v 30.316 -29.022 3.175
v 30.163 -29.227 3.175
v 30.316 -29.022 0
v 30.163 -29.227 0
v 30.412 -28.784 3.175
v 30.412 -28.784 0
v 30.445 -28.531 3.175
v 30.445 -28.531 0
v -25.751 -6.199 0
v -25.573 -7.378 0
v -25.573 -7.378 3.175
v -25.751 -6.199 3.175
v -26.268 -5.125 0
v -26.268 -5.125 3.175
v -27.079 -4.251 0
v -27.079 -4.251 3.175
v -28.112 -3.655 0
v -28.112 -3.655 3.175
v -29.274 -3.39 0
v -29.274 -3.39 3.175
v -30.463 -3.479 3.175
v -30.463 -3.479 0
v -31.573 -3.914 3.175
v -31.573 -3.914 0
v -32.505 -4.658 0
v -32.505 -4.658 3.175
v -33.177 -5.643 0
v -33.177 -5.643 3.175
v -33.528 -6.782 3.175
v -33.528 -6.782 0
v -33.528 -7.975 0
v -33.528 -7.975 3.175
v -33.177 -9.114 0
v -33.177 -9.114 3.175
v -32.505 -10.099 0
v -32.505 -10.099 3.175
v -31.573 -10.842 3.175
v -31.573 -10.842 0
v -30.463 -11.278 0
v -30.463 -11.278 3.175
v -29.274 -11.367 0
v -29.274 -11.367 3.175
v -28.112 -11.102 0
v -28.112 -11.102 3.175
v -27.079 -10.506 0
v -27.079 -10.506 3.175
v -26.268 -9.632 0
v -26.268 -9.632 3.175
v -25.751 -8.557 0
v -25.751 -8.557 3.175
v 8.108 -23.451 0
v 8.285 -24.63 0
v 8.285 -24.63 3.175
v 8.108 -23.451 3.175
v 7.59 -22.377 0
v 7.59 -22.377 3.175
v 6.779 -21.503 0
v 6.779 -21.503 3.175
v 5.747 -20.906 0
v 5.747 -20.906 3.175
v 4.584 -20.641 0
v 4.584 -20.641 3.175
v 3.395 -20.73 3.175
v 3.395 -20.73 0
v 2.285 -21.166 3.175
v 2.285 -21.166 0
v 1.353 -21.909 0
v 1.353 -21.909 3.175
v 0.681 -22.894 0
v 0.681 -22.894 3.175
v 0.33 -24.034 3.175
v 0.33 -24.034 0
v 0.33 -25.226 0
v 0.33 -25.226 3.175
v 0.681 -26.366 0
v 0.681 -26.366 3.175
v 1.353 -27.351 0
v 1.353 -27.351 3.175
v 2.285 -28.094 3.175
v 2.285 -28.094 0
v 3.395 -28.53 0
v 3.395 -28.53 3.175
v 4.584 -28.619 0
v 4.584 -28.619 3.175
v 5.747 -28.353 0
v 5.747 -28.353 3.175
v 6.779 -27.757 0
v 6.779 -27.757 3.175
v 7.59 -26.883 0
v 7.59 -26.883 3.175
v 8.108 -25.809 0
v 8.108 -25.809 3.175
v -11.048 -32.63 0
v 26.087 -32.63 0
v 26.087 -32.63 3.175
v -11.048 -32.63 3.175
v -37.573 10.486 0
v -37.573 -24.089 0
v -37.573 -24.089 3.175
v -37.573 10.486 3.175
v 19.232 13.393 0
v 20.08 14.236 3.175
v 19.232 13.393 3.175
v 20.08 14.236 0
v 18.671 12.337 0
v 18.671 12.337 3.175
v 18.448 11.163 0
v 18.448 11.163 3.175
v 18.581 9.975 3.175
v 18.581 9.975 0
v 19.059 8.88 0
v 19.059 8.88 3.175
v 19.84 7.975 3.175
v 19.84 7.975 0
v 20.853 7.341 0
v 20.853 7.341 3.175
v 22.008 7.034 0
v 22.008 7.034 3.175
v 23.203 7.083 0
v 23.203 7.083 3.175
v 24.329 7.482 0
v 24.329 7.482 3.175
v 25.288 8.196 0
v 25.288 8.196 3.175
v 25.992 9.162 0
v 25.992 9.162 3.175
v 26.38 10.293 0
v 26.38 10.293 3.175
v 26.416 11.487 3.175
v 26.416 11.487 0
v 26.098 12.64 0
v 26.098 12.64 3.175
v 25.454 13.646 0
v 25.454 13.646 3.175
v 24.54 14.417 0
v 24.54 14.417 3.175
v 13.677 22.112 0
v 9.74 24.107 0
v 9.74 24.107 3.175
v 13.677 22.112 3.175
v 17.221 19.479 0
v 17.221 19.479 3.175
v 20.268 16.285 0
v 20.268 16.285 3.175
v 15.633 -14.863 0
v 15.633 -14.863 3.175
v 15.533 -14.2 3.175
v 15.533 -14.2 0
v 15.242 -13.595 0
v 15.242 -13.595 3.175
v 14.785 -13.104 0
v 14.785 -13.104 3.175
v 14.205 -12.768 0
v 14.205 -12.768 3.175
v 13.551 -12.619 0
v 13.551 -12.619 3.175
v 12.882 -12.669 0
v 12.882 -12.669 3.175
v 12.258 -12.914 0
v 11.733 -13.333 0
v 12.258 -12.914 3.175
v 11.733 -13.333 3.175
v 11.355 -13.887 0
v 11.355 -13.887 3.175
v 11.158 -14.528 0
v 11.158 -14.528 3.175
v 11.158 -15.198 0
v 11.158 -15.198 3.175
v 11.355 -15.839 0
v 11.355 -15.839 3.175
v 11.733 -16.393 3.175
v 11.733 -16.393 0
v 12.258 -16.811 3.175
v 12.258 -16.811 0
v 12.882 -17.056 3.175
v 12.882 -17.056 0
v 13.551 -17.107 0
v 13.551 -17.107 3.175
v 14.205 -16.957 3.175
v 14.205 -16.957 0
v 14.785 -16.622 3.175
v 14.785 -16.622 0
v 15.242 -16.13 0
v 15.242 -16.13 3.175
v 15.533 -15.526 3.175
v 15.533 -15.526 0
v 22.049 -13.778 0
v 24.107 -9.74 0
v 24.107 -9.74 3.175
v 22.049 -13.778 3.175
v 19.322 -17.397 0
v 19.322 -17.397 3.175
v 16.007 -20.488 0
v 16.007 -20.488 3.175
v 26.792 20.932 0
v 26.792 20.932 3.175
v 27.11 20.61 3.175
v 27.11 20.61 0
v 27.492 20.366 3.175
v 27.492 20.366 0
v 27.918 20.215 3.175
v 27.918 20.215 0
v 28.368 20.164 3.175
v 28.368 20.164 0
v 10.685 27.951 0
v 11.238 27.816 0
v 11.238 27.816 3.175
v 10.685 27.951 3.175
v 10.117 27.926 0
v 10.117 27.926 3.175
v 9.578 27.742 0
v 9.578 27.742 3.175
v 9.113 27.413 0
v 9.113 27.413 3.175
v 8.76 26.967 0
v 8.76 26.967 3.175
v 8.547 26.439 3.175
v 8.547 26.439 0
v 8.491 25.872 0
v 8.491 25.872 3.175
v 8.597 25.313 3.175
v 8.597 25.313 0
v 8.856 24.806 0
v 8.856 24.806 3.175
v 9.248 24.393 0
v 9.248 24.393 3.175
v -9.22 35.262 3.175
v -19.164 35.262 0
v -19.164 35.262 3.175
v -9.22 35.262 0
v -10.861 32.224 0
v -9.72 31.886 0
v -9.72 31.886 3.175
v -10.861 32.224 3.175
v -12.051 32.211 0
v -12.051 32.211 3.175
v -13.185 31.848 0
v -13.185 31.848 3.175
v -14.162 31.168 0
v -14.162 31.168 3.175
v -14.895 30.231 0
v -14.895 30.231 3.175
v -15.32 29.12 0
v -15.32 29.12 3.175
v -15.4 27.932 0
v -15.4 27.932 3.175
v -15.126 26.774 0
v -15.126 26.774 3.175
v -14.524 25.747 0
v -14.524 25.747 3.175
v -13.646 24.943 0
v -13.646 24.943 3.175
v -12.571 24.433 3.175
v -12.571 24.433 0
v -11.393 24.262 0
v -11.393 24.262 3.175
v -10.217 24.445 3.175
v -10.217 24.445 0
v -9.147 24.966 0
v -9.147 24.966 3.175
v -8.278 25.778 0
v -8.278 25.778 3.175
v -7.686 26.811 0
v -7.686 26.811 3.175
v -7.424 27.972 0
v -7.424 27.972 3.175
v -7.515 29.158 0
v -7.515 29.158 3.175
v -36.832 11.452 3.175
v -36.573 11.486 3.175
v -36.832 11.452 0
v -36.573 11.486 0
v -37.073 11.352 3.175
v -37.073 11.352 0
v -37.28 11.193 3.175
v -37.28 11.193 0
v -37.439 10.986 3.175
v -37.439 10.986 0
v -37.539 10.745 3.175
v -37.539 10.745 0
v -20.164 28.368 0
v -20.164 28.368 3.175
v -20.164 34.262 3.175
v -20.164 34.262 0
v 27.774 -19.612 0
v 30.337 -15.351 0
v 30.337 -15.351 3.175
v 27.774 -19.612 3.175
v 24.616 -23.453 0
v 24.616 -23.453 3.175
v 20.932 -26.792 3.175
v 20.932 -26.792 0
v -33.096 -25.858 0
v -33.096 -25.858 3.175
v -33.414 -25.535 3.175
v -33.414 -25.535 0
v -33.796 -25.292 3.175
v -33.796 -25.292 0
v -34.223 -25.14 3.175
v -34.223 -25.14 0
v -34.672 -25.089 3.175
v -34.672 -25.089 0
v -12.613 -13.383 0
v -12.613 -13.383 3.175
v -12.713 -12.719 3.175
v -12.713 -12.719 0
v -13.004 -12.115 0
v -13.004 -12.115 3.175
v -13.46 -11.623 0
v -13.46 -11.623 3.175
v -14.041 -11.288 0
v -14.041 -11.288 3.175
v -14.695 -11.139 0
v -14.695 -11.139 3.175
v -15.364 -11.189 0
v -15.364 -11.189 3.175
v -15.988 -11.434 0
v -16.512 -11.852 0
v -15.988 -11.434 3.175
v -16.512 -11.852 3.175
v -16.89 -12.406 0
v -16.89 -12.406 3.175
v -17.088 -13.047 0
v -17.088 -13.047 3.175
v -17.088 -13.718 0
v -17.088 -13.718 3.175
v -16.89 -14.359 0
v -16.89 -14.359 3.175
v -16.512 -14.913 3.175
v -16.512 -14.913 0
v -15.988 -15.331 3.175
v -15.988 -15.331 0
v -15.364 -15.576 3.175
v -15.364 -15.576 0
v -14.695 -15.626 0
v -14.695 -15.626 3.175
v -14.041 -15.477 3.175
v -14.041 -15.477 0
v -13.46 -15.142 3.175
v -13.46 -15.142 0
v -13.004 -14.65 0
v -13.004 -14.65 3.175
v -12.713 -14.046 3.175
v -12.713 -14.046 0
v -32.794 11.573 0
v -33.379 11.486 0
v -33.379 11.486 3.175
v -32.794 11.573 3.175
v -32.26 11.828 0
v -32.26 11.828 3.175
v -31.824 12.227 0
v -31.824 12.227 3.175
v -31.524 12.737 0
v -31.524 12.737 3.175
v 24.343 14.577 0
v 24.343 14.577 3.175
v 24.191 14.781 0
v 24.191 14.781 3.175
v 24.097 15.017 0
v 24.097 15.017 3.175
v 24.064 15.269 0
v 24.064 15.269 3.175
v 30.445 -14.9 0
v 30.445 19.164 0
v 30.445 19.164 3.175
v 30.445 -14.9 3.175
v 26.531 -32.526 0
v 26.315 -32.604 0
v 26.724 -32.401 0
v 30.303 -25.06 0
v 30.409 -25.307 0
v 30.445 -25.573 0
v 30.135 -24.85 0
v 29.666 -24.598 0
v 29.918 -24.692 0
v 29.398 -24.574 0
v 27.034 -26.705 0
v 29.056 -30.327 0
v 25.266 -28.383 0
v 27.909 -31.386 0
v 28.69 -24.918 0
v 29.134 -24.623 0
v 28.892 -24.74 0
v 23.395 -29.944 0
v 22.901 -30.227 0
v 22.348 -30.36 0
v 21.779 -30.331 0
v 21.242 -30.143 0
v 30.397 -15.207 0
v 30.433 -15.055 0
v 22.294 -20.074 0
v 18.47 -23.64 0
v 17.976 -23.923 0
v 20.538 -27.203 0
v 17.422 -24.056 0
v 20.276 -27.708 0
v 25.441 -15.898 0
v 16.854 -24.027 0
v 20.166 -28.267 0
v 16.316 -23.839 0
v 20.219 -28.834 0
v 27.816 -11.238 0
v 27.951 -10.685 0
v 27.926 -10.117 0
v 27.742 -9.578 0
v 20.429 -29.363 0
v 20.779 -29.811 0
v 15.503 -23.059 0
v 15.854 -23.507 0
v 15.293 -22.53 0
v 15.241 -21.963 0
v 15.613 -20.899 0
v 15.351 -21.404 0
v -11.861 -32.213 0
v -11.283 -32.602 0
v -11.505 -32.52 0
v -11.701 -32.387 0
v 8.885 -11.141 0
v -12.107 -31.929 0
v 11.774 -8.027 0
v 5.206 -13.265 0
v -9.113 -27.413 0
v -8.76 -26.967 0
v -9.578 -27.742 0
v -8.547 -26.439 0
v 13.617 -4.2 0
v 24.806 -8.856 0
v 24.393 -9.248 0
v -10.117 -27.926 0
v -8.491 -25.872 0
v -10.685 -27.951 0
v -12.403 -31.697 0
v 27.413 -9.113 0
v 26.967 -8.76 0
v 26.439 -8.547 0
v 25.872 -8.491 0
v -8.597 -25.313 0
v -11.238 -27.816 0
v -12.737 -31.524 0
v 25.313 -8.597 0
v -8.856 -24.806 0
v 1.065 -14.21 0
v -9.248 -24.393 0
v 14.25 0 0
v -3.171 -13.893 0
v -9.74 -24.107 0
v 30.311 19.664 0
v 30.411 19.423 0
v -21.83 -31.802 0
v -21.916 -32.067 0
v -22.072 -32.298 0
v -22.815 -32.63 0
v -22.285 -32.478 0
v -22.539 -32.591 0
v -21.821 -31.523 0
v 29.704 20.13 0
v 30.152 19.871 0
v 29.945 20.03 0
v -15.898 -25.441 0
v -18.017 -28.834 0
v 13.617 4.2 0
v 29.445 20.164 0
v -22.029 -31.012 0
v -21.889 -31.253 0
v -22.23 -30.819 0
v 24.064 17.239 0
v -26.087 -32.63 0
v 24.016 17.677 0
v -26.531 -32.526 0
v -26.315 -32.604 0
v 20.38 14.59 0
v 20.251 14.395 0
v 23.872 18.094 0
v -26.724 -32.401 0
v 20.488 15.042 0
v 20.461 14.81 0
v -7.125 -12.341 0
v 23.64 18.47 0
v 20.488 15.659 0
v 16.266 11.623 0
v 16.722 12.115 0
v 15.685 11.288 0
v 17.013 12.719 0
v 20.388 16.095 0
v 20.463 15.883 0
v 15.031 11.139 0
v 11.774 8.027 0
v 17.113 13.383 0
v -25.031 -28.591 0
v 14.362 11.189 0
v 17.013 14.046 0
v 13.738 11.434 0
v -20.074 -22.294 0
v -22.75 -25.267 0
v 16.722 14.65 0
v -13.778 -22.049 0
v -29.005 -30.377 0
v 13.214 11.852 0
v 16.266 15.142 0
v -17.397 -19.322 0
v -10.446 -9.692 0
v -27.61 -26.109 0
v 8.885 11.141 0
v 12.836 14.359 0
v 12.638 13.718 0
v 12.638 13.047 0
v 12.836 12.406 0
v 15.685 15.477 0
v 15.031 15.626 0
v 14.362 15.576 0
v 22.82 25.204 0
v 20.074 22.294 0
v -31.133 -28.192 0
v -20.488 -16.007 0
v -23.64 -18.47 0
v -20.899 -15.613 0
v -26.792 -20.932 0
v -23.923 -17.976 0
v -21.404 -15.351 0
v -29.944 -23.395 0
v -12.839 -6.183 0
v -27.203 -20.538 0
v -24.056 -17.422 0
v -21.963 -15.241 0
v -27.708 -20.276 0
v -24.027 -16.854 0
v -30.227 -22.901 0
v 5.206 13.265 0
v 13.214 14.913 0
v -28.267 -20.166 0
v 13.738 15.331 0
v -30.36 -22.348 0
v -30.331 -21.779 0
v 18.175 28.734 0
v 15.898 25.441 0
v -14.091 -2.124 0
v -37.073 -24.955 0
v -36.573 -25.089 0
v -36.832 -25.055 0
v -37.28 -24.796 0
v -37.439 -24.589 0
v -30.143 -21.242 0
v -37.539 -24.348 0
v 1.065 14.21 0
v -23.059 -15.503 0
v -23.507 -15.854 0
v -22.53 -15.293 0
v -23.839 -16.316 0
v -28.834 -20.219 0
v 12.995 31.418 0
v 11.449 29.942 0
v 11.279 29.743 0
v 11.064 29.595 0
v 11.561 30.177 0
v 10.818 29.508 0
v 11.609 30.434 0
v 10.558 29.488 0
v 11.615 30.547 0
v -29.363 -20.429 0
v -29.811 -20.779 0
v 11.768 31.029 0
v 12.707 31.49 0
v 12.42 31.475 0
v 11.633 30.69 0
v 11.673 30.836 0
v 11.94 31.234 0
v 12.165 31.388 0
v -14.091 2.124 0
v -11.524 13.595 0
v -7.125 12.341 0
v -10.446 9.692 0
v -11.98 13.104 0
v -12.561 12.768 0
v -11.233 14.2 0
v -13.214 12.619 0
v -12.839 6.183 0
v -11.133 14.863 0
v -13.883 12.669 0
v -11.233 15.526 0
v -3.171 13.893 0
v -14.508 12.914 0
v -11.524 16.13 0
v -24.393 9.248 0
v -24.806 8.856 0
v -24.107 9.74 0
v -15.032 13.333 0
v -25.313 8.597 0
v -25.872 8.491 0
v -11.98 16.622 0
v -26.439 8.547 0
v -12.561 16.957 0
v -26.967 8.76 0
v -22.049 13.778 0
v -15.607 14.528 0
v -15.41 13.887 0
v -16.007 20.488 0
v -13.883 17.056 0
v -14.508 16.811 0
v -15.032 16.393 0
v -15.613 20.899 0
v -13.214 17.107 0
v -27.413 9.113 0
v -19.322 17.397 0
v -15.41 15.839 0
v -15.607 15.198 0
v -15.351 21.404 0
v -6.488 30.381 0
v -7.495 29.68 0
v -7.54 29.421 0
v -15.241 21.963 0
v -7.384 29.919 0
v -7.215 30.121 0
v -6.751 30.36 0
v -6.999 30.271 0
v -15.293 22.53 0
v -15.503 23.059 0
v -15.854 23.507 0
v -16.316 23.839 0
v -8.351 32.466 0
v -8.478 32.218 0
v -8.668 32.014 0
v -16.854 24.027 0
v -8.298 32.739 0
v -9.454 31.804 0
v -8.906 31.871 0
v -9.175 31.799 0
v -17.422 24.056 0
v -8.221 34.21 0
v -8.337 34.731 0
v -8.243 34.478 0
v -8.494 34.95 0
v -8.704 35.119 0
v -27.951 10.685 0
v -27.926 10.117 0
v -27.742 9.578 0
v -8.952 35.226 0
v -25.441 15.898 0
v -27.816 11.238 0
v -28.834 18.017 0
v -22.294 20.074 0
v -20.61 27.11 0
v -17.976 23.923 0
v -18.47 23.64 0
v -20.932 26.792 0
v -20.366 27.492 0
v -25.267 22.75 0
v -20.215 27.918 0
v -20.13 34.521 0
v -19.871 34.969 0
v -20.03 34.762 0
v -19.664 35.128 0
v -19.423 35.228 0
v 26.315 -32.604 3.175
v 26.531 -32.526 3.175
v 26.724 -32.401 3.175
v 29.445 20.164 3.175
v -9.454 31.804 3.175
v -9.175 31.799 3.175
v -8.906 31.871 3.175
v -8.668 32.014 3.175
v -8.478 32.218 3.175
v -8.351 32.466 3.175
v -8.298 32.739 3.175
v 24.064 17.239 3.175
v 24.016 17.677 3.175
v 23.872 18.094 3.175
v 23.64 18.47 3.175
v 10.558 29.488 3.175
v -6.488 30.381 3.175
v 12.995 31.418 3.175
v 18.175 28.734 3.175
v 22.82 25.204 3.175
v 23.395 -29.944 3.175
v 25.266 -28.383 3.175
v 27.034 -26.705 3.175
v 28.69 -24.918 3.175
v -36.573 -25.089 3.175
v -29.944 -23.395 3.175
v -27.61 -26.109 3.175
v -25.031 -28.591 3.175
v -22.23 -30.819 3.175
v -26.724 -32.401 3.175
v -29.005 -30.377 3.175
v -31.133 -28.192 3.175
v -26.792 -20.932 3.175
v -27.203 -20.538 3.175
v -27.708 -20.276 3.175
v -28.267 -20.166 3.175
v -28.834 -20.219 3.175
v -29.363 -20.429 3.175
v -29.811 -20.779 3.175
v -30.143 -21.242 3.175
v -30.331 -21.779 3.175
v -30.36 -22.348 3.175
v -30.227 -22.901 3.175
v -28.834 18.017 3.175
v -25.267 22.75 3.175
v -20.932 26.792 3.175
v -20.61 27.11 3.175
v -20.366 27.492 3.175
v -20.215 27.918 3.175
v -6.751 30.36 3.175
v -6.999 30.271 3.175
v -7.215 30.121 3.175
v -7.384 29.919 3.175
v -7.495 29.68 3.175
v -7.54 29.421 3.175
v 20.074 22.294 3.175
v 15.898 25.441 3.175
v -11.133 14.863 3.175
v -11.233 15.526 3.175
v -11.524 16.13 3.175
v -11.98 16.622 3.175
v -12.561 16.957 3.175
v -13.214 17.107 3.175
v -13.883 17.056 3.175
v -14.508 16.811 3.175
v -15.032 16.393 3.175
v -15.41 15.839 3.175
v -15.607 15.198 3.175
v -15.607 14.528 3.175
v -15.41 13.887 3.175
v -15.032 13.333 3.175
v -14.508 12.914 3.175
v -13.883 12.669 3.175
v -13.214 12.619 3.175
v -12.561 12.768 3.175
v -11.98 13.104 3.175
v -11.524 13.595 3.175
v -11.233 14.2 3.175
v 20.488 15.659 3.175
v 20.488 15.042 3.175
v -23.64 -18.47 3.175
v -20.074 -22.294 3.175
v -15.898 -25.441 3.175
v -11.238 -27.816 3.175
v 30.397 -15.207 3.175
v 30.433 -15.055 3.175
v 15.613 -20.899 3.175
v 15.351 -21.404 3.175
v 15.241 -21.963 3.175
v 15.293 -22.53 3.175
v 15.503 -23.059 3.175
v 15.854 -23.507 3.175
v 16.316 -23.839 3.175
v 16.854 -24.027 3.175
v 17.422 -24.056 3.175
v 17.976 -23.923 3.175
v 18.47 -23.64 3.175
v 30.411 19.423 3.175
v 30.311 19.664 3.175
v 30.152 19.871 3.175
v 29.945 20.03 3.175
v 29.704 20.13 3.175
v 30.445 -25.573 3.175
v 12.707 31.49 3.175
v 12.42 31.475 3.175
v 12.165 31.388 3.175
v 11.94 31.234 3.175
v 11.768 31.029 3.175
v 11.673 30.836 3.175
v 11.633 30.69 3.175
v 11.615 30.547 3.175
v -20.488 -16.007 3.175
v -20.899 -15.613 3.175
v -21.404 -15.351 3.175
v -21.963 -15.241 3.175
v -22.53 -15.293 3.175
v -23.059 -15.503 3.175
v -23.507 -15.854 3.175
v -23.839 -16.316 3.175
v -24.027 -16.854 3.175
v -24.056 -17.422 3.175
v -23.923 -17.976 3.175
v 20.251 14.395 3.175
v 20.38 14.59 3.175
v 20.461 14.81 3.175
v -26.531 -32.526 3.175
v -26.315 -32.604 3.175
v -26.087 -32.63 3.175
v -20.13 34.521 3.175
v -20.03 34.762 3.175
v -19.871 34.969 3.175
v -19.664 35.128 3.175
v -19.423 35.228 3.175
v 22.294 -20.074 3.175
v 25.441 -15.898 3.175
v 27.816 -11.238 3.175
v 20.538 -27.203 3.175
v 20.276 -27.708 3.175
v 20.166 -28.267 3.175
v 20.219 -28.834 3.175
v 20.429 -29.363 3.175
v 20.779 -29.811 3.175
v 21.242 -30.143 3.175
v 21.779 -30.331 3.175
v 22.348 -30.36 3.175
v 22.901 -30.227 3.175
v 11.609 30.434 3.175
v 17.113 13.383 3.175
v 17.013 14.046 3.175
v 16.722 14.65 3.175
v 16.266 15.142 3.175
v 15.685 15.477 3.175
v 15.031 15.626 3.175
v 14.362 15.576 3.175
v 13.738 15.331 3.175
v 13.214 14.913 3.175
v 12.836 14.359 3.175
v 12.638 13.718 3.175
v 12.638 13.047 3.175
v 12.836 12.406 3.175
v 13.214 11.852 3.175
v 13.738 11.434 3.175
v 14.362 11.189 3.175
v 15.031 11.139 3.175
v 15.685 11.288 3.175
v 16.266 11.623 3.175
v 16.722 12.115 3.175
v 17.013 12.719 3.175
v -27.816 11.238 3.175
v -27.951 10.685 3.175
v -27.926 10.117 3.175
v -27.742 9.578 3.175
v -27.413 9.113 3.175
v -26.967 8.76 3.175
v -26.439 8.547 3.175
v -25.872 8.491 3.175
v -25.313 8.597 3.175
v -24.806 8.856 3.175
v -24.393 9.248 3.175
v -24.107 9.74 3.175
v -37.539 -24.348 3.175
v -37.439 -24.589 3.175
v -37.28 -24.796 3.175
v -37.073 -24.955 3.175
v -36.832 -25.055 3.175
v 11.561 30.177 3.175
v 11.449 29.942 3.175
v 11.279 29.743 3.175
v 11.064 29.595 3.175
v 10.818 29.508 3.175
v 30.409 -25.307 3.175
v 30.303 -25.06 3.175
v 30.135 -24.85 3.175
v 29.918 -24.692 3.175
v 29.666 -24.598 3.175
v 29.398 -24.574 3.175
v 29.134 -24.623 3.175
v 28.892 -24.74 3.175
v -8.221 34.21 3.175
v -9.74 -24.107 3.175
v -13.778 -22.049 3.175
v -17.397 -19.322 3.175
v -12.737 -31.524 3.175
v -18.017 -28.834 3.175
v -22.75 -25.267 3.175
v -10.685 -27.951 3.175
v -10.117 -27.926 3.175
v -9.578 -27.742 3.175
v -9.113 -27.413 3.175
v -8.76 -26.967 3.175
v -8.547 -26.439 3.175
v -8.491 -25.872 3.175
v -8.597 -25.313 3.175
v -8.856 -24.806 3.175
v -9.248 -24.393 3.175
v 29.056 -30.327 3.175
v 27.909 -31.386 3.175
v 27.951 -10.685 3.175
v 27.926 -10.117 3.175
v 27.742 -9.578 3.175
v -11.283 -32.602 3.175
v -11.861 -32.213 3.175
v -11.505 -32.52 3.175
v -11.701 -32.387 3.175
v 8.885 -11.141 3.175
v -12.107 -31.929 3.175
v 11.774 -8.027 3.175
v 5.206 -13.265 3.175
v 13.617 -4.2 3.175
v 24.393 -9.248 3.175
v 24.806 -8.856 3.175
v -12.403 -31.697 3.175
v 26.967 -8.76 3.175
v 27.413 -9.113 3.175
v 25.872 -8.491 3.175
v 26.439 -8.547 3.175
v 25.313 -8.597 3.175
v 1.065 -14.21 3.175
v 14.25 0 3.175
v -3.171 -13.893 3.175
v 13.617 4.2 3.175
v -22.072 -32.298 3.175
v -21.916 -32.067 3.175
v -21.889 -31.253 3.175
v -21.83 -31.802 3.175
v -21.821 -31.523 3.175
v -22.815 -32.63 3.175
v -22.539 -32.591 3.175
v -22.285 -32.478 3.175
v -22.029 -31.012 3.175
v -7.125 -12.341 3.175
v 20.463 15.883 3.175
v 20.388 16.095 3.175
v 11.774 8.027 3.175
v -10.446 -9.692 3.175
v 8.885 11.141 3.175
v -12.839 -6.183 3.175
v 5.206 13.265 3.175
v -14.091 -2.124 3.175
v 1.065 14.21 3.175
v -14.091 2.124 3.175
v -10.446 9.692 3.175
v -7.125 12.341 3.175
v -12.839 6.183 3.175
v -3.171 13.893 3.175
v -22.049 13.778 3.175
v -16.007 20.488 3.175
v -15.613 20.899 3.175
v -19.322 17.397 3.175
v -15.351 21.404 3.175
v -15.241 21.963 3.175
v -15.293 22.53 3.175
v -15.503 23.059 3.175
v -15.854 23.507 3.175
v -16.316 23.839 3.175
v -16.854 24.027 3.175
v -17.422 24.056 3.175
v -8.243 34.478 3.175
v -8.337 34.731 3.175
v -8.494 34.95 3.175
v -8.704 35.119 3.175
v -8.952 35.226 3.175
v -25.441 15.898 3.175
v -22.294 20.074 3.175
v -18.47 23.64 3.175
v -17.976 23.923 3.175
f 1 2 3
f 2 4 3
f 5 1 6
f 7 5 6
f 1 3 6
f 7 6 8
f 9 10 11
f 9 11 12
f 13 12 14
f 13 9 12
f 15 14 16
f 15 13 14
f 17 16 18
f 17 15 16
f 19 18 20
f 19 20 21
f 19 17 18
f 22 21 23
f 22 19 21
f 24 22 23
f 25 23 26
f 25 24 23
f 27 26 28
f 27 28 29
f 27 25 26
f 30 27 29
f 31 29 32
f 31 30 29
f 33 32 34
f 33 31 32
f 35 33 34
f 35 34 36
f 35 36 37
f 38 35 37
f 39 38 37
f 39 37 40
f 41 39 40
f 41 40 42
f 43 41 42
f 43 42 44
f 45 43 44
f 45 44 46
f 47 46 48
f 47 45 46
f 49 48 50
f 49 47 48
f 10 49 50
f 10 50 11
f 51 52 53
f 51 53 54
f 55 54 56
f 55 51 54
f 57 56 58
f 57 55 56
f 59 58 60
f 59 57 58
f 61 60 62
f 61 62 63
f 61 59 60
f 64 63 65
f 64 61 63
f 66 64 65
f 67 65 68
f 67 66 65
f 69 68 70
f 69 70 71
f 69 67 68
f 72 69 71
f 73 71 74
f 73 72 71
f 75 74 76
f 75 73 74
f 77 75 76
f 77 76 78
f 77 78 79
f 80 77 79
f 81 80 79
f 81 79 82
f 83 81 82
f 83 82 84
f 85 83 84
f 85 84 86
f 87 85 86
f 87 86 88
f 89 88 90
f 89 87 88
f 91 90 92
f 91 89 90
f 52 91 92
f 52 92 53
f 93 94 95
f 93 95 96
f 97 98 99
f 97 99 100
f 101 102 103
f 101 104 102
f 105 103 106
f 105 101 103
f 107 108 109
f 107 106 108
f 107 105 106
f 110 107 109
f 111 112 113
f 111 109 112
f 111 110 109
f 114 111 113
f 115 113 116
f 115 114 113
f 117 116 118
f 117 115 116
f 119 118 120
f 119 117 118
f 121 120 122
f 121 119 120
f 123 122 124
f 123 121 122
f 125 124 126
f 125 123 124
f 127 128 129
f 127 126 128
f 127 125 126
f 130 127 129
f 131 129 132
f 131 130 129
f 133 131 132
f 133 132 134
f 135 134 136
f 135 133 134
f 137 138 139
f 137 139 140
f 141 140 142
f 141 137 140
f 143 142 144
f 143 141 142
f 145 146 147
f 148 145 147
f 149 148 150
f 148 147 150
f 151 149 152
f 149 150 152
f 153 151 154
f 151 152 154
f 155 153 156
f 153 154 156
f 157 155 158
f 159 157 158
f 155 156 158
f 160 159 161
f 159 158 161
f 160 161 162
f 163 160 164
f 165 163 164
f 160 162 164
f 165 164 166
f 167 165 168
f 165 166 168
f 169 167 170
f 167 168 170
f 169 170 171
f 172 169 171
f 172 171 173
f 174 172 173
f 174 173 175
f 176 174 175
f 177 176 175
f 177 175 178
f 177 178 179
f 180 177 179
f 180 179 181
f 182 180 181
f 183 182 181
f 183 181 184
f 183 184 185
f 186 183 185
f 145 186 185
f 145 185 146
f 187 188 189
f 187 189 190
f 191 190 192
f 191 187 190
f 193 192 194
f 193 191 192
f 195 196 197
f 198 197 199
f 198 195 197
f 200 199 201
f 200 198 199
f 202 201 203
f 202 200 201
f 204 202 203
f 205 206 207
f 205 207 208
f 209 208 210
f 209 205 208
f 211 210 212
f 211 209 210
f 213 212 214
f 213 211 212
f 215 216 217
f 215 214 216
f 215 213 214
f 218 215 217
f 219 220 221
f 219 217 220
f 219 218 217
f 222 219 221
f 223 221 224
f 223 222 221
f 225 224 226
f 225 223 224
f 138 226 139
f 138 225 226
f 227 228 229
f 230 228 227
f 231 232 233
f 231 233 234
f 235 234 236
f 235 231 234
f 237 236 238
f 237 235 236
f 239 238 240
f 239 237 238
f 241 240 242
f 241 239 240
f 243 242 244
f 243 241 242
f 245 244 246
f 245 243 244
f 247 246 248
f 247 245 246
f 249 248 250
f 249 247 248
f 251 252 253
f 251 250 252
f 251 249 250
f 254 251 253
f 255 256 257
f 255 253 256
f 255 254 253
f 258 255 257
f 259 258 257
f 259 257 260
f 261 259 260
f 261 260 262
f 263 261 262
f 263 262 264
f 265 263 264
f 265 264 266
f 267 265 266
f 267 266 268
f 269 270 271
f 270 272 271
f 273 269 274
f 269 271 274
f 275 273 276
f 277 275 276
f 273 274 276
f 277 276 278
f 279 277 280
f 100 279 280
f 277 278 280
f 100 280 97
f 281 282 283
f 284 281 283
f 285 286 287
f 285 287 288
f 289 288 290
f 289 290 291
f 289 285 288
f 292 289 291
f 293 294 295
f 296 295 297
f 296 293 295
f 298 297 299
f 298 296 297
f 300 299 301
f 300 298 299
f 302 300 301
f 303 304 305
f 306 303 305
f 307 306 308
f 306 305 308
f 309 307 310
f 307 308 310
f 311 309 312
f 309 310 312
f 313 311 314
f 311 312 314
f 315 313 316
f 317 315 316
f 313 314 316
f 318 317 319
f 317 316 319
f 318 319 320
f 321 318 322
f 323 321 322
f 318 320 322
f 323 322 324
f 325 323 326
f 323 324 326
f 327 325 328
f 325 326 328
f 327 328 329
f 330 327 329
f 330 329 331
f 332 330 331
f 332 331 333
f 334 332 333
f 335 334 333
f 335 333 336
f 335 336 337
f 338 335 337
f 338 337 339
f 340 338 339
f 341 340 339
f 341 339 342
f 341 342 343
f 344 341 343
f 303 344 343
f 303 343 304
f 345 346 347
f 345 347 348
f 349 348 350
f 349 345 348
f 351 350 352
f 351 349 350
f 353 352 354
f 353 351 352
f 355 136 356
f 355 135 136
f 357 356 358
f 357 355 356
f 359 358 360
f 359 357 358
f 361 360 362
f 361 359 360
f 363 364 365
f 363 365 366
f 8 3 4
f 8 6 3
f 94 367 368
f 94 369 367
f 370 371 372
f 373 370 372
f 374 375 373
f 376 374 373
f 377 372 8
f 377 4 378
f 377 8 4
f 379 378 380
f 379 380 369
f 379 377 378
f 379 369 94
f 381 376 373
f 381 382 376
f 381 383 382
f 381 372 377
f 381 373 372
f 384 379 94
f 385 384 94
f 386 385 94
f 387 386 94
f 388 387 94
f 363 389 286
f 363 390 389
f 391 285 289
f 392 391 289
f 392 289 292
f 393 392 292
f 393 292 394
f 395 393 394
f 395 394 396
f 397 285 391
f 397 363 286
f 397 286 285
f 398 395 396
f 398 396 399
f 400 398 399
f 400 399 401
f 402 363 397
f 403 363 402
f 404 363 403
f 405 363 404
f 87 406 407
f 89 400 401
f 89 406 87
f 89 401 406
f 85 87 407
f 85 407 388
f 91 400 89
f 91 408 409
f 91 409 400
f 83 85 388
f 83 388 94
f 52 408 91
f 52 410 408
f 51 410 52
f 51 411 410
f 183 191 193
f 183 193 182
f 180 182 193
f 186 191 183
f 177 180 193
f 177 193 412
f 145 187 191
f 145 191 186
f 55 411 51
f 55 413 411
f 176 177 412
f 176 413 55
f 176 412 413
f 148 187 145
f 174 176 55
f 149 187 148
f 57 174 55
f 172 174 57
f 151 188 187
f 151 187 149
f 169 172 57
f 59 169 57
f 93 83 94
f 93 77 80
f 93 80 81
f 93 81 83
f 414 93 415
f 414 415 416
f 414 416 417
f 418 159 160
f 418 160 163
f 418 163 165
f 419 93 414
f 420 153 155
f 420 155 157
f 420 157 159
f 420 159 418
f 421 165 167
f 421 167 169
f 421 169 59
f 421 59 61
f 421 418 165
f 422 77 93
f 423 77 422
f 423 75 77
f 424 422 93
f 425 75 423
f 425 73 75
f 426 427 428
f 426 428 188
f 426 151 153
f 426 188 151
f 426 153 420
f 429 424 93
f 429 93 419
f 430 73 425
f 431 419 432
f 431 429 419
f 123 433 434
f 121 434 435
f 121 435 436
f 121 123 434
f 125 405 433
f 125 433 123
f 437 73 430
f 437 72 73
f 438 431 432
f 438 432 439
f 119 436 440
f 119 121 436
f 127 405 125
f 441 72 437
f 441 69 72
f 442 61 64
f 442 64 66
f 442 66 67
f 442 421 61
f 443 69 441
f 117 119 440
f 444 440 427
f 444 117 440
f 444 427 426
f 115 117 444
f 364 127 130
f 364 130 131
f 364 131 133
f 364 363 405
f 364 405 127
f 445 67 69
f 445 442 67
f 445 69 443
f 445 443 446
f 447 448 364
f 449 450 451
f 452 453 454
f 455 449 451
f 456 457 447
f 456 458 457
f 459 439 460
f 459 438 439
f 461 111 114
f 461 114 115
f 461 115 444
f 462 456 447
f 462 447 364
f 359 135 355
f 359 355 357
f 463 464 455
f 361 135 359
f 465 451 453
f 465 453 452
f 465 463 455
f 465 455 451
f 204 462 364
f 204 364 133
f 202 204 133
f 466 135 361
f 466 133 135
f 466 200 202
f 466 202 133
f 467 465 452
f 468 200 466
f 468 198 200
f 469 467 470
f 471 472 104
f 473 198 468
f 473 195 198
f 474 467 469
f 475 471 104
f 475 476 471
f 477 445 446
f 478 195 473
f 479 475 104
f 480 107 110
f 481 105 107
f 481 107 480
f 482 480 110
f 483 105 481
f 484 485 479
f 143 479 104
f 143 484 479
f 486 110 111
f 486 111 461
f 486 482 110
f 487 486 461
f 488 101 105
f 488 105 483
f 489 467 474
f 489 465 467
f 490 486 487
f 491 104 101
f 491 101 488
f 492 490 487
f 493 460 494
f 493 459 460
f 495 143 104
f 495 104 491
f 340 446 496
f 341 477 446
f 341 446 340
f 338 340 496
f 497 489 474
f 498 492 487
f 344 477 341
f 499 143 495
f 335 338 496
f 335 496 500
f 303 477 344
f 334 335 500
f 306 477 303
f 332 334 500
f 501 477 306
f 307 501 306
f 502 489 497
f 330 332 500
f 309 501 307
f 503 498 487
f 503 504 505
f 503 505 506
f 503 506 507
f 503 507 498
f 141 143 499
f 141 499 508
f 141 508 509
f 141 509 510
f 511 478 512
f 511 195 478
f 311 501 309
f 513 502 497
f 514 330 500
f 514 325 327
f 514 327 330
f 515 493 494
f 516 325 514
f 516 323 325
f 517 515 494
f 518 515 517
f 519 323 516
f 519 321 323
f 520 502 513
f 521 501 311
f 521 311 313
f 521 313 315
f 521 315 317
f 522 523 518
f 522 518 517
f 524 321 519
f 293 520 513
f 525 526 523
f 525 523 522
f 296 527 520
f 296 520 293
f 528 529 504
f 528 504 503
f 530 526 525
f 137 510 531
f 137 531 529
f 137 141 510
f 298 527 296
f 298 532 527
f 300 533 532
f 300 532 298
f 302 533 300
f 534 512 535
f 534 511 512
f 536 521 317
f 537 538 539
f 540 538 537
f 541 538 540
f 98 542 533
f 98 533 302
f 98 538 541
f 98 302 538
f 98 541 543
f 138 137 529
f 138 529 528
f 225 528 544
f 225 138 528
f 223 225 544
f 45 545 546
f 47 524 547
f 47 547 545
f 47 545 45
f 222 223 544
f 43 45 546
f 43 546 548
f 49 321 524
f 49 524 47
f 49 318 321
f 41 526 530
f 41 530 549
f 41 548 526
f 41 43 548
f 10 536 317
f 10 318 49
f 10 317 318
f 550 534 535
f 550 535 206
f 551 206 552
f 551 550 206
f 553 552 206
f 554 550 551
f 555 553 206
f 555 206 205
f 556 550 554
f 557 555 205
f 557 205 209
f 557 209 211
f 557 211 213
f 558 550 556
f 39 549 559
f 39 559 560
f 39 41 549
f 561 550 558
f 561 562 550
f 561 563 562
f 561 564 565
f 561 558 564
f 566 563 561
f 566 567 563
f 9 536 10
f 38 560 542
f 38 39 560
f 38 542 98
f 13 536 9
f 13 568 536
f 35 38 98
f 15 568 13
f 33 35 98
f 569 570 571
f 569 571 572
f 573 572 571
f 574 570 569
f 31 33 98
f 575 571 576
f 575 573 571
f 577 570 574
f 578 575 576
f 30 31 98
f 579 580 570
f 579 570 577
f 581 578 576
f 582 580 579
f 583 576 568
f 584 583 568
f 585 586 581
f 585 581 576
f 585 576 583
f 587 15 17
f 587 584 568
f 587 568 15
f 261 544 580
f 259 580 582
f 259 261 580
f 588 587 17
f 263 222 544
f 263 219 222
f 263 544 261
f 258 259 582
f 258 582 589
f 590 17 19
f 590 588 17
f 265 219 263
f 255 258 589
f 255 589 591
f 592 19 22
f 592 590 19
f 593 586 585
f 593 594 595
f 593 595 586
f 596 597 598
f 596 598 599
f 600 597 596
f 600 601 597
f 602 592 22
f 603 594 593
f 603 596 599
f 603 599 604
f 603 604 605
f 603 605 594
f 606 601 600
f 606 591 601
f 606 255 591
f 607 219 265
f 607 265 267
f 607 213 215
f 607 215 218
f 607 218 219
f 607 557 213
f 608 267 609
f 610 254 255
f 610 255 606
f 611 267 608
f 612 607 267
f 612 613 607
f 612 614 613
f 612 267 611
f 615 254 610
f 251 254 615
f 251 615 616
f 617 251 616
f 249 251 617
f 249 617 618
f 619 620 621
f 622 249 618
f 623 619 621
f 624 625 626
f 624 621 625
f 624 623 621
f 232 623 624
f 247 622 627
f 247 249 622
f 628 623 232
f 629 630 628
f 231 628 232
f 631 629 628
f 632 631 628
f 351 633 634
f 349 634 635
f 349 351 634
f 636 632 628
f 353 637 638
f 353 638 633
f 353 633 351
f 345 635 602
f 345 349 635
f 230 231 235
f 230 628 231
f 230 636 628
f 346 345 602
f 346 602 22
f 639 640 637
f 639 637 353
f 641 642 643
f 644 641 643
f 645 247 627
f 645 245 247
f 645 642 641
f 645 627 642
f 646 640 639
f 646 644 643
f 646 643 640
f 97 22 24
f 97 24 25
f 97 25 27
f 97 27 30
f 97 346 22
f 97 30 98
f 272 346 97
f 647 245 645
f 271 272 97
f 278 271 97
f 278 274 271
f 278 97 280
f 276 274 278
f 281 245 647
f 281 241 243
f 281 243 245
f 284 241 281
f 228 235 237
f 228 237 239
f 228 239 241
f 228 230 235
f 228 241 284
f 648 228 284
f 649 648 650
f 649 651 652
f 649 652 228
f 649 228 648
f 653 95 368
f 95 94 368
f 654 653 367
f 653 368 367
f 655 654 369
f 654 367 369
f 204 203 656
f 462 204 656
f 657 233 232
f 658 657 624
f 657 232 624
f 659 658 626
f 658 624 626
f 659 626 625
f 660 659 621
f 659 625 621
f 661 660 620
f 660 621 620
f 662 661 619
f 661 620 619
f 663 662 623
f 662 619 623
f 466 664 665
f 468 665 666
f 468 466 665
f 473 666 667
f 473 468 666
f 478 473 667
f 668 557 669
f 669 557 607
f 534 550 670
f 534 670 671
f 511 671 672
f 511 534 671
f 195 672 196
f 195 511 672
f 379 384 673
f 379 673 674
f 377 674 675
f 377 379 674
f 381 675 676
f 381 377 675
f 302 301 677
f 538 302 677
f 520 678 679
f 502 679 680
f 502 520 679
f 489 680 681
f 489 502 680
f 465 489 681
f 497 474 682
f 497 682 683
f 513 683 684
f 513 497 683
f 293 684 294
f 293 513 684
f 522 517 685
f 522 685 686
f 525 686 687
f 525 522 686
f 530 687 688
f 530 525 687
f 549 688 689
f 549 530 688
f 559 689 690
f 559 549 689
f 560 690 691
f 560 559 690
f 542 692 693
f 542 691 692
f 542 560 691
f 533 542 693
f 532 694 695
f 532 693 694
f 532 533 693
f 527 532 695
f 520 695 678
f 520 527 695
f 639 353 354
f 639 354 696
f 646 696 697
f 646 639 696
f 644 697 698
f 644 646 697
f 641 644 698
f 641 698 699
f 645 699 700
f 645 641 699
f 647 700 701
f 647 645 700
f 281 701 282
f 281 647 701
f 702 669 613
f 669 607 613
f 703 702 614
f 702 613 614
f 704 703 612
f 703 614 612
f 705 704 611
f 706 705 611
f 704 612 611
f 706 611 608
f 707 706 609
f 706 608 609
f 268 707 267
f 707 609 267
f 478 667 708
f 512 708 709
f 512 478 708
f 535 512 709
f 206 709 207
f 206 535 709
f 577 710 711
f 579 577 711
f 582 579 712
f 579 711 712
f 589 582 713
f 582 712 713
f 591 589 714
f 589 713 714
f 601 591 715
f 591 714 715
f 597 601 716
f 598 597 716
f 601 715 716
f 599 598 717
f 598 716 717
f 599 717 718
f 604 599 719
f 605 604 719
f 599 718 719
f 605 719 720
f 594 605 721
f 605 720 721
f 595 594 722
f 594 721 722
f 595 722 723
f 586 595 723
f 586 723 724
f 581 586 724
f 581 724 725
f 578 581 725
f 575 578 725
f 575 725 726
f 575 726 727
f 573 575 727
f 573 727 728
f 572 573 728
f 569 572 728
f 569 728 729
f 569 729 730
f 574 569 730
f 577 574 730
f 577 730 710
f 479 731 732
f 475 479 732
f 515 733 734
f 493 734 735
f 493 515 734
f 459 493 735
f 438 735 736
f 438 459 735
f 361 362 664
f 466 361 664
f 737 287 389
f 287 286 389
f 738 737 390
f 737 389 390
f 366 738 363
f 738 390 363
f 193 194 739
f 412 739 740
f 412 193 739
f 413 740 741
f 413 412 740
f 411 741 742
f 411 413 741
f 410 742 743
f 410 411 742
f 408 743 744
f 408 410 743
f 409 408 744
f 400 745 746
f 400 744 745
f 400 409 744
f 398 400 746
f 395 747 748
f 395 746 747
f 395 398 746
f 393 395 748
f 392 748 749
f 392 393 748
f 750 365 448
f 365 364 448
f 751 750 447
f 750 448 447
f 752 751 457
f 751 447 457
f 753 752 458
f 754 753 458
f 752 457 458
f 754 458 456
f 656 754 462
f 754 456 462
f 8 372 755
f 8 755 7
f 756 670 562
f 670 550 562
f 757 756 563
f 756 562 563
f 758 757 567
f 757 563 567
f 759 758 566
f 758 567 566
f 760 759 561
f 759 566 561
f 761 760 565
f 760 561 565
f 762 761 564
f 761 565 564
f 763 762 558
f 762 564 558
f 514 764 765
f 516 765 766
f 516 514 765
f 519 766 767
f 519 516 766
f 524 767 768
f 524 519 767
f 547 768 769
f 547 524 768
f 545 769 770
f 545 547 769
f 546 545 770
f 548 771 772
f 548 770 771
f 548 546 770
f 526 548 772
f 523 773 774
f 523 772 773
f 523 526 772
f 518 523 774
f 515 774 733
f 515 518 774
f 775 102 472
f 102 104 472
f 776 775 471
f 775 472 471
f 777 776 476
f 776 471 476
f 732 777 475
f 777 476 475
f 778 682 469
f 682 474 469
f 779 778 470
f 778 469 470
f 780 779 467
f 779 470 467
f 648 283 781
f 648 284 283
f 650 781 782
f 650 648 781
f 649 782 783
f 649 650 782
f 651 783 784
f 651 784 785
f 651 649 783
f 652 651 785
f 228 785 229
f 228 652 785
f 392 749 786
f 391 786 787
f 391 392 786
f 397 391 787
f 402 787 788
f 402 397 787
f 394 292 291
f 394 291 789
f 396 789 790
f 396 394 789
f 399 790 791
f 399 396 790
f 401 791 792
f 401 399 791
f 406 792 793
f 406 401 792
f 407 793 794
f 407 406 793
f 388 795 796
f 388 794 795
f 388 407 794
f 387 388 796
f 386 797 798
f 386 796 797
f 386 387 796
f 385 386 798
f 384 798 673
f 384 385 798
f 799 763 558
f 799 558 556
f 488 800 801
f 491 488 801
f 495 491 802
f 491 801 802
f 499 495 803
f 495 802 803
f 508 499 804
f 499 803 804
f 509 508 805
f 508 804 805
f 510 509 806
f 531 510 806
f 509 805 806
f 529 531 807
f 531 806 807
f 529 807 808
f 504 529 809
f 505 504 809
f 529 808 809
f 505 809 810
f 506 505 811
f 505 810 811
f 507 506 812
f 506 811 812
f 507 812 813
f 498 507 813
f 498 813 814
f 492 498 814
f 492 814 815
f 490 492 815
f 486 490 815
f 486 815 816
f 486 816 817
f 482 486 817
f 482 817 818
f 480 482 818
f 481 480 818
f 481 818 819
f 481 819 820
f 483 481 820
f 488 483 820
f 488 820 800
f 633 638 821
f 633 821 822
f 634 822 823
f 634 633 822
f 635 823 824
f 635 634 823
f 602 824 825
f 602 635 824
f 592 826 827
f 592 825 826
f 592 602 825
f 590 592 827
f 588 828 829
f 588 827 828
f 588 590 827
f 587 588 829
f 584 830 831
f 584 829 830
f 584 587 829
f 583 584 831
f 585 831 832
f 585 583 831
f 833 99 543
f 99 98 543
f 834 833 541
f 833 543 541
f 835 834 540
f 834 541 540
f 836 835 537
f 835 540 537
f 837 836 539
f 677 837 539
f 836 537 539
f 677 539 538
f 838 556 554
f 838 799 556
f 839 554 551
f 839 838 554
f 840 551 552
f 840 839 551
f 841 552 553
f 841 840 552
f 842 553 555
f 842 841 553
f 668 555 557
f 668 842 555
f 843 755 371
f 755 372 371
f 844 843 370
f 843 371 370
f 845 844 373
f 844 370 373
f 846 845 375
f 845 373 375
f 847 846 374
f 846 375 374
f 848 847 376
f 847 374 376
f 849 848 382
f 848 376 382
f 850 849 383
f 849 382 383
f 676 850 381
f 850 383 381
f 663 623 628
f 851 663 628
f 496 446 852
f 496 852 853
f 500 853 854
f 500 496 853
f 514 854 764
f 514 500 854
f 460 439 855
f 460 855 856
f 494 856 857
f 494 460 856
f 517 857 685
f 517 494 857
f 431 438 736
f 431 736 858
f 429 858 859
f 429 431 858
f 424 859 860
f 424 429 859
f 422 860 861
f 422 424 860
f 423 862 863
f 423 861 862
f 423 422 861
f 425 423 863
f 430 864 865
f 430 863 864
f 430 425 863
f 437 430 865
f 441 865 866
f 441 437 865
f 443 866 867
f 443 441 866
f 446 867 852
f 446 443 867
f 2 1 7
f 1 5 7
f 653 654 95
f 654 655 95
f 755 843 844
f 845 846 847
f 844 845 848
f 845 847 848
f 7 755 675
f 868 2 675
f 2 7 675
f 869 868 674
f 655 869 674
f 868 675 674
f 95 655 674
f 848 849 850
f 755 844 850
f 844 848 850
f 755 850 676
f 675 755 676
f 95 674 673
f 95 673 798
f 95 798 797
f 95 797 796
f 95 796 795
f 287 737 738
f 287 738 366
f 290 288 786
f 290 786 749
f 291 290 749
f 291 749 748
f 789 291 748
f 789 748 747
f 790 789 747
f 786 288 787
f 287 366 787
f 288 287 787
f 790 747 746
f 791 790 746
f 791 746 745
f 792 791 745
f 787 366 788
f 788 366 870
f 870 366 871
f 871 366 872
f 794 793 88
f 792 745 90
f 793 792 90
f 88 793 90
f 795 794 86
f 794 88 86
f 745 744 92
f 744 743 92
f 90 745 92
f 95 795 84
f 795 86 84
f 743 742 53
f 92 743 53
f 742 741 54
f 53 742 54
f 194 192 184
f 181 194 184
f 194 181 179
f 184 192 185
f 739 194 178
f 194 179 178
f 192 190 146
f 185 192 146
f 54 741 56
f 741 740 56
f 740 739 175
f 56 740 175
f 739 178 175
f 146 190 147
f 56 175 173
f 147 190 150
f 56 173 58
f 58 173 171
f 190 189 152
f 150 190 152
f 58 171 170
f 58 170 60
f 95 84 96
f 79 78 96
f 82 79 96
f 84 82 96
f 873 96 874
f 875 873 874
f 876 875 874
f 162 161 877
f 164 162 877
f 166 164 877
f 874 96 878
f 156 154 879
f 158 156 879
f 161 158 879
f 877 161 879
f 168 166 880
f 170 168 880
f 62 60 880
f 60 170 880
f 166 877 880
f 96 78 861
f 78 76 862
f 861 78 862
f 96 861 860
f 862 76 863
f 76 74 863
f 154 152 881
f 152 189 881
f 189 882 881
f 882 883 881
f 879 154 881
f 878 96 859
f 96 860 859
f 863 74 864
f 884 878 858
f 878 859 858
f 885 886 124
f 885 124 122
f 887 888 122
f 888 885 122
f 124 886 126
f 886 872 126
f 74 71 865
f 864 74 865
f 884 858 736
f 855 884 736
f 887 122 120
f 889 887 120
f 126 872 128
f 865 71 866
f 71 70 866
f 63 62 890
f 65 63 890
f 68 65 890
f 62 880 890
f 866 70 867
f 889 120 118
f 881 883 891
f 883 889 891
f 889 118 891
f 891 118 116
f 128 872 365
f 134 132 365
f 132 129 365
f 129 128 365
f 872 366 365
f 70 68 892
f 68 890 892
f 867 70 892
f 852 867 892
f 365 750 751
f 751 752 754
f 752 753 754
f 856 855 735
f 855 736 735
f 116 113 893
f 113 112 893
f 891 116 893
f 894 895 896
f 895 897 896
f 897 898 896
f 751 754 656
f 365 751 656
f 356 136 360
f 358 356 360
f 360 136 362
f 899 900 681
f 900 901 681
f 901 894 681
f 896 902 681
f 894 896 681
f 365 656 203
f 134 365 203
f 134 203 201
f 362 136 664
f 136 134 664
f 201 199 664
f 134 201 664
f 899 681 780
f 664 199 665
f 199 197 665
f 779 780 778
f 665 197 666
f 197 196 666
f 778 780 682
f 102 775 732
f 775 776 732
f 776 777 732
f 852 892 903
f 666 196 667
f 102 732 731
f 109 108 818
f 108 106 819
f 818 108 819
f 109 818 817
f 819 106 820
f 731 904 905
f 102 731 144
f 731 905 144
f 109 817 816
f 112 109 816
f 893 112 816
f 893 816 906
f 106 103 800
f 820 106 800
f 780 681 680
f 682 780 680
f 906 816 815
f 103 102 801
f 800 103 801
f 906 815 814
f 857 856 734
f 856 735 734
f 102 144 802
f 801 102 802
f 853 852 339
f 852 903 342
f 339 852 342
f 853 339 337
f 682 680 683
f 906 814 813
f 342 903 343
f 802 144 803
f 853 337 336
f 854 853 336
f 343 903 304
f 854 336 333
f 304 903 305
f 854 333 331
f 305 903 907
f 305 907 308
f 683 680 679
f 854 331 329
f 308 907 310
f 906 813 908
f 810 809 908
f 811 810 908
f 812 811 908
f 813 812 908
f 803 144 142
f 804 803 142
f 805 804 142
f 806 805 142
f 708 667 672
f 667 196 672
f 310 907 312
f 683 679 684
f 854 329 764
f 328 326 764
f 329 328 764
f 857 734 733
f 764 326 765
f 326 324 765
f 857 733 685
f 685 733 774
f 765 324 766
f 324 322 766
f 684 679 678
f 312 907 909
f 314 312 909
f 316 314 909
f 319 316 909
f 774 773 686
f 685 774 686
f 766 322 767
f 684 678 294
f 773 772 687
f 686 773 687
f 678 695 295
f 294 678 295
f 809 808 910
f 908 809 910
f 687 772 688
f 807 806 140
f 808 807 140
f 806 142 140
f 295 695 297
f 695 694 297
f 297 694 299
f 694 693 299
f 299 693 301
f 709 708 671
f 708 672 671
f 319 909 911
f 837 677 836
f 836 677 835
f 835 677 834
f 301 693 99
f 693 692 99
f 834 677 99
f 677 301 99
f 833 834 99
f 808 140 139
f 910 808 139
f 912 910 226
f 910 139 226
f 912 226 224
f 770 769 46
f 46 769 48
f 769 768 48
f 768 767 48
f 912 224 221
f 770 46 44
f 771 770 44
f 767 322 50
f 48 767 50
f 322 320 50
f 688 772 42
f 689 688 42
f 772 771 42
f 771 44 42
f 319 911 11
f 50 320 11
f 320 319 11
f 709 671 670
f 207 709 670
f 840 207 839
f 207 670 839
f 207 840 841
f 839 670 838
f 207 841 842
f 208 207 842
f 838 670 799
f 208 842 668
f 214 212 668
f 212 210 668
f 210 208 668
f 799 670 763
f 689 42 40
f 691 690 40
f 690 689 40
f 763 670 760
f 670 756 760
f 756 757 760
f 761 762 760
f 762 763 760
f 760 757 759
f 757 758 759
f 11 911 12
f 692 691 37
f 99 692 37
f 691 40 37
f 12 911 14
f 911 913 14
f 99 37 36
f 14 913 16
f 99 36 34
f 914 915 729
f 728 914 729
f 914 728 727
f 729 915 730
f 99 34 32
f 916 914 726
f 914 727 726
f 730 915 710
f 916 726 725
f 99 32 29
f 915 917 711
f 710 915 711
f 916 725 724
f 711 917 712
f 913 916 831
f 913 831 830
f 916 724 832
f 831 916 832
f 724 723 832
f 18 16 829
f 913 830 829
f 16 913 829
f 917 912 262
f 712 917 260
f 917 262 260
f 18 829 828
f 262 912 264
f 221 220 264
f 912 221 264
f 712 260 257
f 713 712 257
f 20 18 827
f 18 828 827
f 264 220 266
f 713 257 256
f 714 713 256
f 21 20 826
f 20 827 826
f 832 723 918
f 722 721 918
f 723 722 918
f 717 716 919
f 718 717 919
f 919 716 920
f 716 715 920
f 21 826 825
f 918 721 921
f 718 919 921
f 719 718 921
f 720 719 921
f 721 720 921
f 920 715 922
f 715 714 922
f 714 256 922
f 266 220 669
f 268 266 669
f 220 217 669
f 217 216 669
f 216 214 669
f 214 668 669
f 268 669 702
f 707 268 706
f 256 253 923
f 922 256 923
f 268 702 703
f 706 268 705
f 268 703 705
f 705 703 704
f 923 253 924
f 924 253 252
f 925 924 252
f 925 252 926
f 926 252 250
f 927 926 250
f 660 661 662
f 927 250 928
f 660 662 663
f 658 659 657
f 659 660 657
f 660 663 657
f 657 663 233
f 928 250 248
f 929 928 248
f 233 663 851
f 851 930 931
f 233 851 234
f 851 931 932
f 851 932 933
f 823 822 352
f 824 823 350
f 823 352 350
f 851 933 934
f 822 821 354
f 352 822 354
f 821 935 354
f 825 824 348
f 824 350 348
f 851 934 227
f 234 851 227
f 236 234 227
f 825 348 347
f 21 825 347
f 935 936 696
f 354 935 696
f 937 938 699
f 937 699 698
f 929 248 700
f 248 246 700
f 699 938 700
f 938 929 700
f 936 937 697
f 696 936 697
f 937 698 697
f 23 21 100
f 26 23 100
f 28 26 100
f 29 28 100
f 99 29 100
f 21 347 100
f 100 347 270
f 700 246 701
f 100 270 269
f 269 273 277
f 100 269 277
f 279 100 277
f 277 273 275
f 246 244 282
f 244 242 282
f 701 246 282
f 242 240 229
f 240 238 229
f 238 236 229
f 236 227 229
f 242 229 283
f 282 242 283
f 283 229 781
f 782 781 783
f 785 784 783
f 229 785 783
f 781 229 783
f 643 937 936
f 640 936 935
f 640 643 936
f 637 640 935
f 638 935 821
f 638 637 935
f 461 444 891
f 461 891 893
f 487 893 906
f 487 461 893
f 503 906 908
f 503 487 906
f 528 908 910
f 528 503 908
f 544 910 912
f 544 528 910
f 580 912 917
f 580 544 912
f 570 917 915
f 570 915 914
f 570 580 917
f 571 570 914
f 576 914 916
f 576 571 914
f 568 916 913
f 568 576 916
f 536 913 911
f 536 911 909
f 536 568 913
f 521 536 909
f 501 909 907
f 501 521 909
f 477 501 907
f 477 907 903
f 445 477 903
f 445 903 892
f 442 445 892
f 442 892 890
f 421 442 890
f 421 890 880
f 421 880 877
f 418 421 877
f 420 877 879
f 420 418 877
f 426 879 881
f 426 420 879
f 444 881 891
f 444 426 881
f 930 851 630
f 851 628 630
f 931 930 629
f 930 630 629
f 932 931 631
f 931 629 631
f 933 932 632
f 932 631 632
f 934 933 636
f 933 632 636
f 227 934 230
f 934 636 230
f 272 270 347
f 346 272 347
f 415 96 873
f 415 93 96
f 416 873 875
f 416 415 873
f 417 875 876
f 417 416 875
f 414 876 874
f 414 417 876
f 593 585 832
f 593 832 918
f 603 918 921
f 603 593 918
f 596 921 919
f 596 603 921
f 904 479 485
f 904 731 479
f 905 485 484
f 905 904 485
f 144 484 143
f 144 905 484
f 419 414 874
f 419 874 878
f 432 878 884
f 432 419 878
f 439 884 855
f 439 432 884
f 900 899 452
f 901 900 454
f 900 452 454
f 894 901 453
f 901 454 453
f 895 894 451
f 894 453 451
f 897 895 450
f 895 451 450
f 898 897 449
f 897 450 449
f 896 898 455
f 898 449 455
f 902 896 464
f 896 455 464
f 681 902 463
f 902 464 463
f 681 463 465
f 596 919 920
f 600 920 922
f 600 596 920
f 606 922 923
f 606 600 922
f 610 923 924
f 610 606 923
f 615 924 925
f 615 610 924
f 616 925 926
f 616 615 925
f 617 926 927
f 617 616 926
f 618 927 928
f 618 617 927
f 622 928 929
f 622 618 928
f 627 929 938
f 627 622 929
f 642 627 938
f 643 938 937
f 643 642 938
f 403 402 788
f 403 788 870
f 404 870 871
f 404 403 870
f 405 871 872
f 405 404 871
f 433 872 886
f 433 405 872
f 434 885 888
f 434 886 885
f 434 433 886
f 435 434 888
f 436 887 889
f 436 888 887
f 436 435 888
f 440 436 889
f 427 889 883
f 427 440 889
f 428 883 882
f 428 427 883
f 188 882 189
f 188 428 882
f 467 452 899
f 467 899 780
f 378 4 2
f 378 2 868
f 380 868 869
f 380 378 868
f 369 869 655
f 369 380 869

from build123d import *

# Parameters (mm, degrees)
SKETCH1_R               = 14.25
SKETCH1_R_2             = 4
BOSS_EXTRUDE1_DEPTH     = 3.175
M4_CLEARANCE_HOLE1_D    = 4.5
VENTHOLES_DEPTH         = 65.263003169
CIRPATTERN1_COUNT       = 4
CUT_EXTRUDE2_DEPTH      = 65.263003169
SKETCH7_W               = 68.017867909
SKETCH7_H               = 13.211155311
CUT_EXTRUDE3_DEPTH      = 65.263003169
CUT_EXTRUDE3_DEPTH_BACK = 65.263003169
CUT_EXTRUDE4_DEPTH      = 52.625675669
CUT_EXTRUDE4_DEPTH_BACK = 52.625675669
CUT_EXTRUDE5_DEPTH      = 52.625675669
CUT_EXTRUDE5_DEPTH_BACK = 52.625675669
FILLET1_R               = 1


with BuildPart() as part:
    # Sketch1 → Boss-Extrude1 (new body)
    with BuildSketch(Plane.XY):
        Polygon((30.444907858, -32.62998798), (-37.572960051, -32.62998798), (-37.572960051, 52.037732697), (30.444907858, 48.473067289), align=None)
        Circle(SKETCH1_R, mode=Mode.SUBTRACT)
        with Locations((-29.572960051, -7.37834899)):
            Circle(SKETCH1_R_2, mode=Mode.SUBTRACT)
        with Locations((-11.413340062, 28.261911978)):
            Circle(SKETCH1_R_2, mode=Mode.SUBTRACT)
        with Locations((22.444907858, 11.010272988)):
            Circle(SKETCH1_R_2, mode=Mode.SUBTRACT)
        with Locations((4.285287868, -24.62998798)):
            Circle(SKETCH1_R_2, mode=Mode.SUBTRACT)
    extrude(amount=BOSS_EXTRUDE1_DEPTH)

    # M4 Clearance Hole1 (through all)
    with Locations(Plane(origin=(0, 0, 0), x_dir=(-1, 0, 0), z_dir=(0, 0, -1))):
        with Locations((-14.86289651, 13.382612127), (13.382612127, 14.86289651), (14.86289651, -13.382612127), (-13.382612127, -14.86289651)):
            Hole(M4_CLEARANCE_HOLE1_D / 2)

    # Sketch4 → VentHoles (cut, through all)
    with BuildSketch(Plane.XY):
        with BuildLine():
            ThreePointArc((-23.395136062, 29.944408637), (-30.348149382, 22.86897088), (-35.232986474, 14.23505055))
            ThreePointArc((-35.232986474, 14.23505055), (-34.127831951, 11.631469654), (-31.524251055, 12.736624176))
            ThreePointArc((-31.524251055, 12.736624176), (-27.153607342, 20.461710787), (-20.932490161, 26.792365623))
            ThreePointArc((-20.932490161, 26.792365623), (-20.587791605, 29.59971008), (-23.395136062, 29.944408637))
        make_face()
        with BuildLine():
            ThreePointArc((-18.46984426, 23.640322608), (-23.959065301, 18.054450695), (-27.815515637, 11.238197802))
            ThreePointArc((-27.815515637, 11.238197802), (-26.710361115, 8.634616906), (-24.106780219, 9.739771429))
            ThreePointArc((-24.106780219, 9.739771429), (-20.764523261, 15.647190602), (-16.007198358, 20.488279594))
            ThreePointArc((-16.007198358, 20.488279594), (-15.662499802, 23.295624052), (-18.46984426, 23.640322608))
        make_face()
        with BuildLine():
            ThreePointArc((-42.65045731, 17.231903297), (-41.545302788, 14.628322401), (-38.941721892, 15.733476923))
            ThreePointArc((-38.941721892, 15.733476923), (-33.542691422, 25.276230972), (-25.857781964, 33.096451651))
            ThreePointArc((-25.857781964, 33.096451651), (-25.513083407, 35.903796109), (-28.320427865, 36.248494666))
            ThreePointArc((-28.320427865, 36.248494666), (-36.737233462, 27.683491065), (-42.65045731, 17.231903297))
        make_face()
    ventholes = extrude(amount=VENTHOLES_DEPTH, mode=Mode.SUBTRACT)

    # CirPattern1: VentHoles ×4 about axis
    cirpattern1_axis = Axis((0, 0, 0), (0, 0, 1))
    for i in range(1, CIRPATTERN1_COUNT):
        add(ventholes.rotate(cirpattern1_axis, i * 360 / CIRPATTERN1_COUNT), mode=Mode.SUBTRACT)

    # Sketch5 → Cut-Extrude2 (cut, through all)
    with BuildSketch(Plane.XY):
        Polygon((12.341413378, 44.414969502), (11.556374035, 29.43552648), (-8.41621666, 30.482245605), (-7.631177317, 45.461688626), align=None)
    extrude(amount=CUT_EXTRUDE2_DEPTH, mode=Mode.SUBTRACT)

    # Sketch7 → Cut-Extrude3 (cut, two sides)
    with BuildSketch(Plane.XY) as cut_extrude3_sk:
        with Locations((-3.564026097, 41.867489633)):
            Rectangle(SKETCH7_W, SKETCH7_H)
    extrude(amount=CUT_EXTRUDE3_DEPTH, mode=Mode.SUBTRACT)
    extrude(cut_extrude3_sk.sketch, amount=-CUT_EXTRUDE3_DEPTH_BACK, mode=Mode.SUBTRACT)


with BuildPart() as cut_extrude3_piece_1:
    # of the separate pieces the step leaves, piece 1, a body of its own (cut_extrude3_pieces)
    add(part.part.solids().sort_by_distance((26.443976335, -32.62998798, 0))[0])

    # Sketch9 → Cut-Extrude4 (cut, two sides)
    with BuildSketch(Plane.XY.offset(3.175)) as cut_extrude4_sk:
        with BuildLine():
            ThreePointArc((24.064301101, 17.238521309), (22.71543741, 15.347484158), (20.488279594, 16.007198358))
            Line((20.488279594, 16.007198358), (20.488279594, 14.499055847))
            ThreePointArc((20.488279594, 14.499055847), (22.256357537, 15.005826613), (24.064301101, 14.667808432))
            Line((24.064301101, 14.667808432), (24.064301101, 17.238521309))
        make_face()
    extrude(amount=CUT_EXTRUDE4_DEPTH, mode=Mode.SUBTRACT)
    extrude(cut_extrude4_sk.sketch, amount=-CUT_EXTRUDE4_DEPTH_BACK, mode=Mode.SUBTRACT)

    # Sketch10 → Cut-Extrude5 (cut, two sides)
    with BuildSketch(Plane.XY.offset(3.175)) as cut_extrude5_sk:
        Polygon((-37.572960051, -32.62998798), (-30.450066979, -32.62998798), (-34.672473159, -25.089104914), (-37.572960051, -25.089104914), align=None)
        Polygon((30.444907858, 36.985955285), (11.775698683, 36.985955285), (28.36838713, 20.163813112), (30.444907858, 20.163813112), align=None)
        with BuildLine():
            Line((-37.572960051, 18.768928392), (-37.572960051, 11.485837363))
            Line((-37.572960051, 11.485837363), (-33.378618764, 11.485837363))
            ThreePointArc((-33.378618764, 11.485837363), (-35.03669391, 12.367451556), (-35.232986474, 14.23505055))
            ThreePointArc((-35.232986474, 14.23505055), (-30.348149382, 22.86897088), (-23.395136062, 29.944408637))
            ThreePointArc((-23.395136062, 29.944408637), (-21.287070818, 30.165975222), (-20.163813112, 28.36838713))
            Line((-20.163813112, 28.36838713), (-20.163813112, 35.261911978))
            Line((-20.163813112, 35.261911978), (-25.17793724, 35.261911978))
            ThreePointArc((-25.17793724, 35.261911978), (-25.180933948, 34.073404246), (-25.857781964, 33.096451651))
            ThreePointArc((-25.857781964, 33.096451651), (-32.514369728, 26.586006868), (-37.572960051, 18.768928392))
        make_face()
    extrude(amount=CUT_EXTRUDE5_DEPTH, mode=Mode.SUBTRACT)
    extrude(cut_extrude5_sk.sketch, amount=-CUT_EXTRUDE5_DEPTH_BACK, mode=Mode.SUBTRACT)

    # Fillet1
    fillet1_edges = [cut_extrude3_piece_1.edges().sort_by_distance(p)[0] for p in [
        (30.444907858, -28.932811573, 1.5875),
        (26.443976335, -32.62998798, 1.5875),
        (-11.631234454, -32.62998798, 1.5875),
        (-19.475212051, -32.62998798, 1.5875),
        (11.714368197, 32.450234687, 1.5875),
        (-8.16572496, 35.261911978, 1.5875),
        (-26.443976335, -32.62998798, 1.5875),
        (11.556374035, 29.43552648, 1.5875),
        (-8.395017915, 30.886741766, 1.5875),
        (-8.07427182, 30.464325035, 1.5875),
        (20.488279594, 16.007198358, 1.5875),
        (20.488279594, 14.499055847, 1.5875),
        (24.064301101, 14.667808432, 1.5875),
        (30.444907858, -22.739999682, 1.5875),
        (-37.572960051, -25.089104914, 1.5875),
        (30.444907858, -15.136300259, 1.5875),
        (30.444907858, 20.163813112, 1.5875),
        (-20.163813112, 35.261911978, 1.5875),
        (-37.572960051, 11.485837363, 1.5875),
    ]]
    fillet(fillet1_edges, radius=FILLET1_R)


with BuildPart() as cut_extrude3_piece_2:
    # of the separate pieces the step leaves, piece 2, a body of its own (cut_extrude3_pieces)
    add(part.part.solids().sort_by_distance((30.444907858, 48.473067289, 0))[0])


with BuildPart() as cut_extrude3_piece_3:
    # of the separate pieces the step leaves, piece 3, a body of its own (cut_extrude3_pieces)
    add(part.part.solids().sort_by_distance((-37.572960051, 35.261911978, 0))[0])


with BuildPart() as cut_extrude3_piece_4:
    # of the separate pieces the step leaves, piece 4, a body of its own (cut_extrude3_pieces)
    add(part.part.solids().sort_by_distance((29.539762417, 35.261911978, 0))[0])


with BuildPart() as cut_extrude3_piece_5:
    # of the separate pieces the step leaves, piece 5, a body of its own (cut_extrude3_pieces)
    add(part.part.solids().sort_by_distance((11.86172196, 35.261911978, 0))[0])


solid = cut_extrude3_piece_1.part
